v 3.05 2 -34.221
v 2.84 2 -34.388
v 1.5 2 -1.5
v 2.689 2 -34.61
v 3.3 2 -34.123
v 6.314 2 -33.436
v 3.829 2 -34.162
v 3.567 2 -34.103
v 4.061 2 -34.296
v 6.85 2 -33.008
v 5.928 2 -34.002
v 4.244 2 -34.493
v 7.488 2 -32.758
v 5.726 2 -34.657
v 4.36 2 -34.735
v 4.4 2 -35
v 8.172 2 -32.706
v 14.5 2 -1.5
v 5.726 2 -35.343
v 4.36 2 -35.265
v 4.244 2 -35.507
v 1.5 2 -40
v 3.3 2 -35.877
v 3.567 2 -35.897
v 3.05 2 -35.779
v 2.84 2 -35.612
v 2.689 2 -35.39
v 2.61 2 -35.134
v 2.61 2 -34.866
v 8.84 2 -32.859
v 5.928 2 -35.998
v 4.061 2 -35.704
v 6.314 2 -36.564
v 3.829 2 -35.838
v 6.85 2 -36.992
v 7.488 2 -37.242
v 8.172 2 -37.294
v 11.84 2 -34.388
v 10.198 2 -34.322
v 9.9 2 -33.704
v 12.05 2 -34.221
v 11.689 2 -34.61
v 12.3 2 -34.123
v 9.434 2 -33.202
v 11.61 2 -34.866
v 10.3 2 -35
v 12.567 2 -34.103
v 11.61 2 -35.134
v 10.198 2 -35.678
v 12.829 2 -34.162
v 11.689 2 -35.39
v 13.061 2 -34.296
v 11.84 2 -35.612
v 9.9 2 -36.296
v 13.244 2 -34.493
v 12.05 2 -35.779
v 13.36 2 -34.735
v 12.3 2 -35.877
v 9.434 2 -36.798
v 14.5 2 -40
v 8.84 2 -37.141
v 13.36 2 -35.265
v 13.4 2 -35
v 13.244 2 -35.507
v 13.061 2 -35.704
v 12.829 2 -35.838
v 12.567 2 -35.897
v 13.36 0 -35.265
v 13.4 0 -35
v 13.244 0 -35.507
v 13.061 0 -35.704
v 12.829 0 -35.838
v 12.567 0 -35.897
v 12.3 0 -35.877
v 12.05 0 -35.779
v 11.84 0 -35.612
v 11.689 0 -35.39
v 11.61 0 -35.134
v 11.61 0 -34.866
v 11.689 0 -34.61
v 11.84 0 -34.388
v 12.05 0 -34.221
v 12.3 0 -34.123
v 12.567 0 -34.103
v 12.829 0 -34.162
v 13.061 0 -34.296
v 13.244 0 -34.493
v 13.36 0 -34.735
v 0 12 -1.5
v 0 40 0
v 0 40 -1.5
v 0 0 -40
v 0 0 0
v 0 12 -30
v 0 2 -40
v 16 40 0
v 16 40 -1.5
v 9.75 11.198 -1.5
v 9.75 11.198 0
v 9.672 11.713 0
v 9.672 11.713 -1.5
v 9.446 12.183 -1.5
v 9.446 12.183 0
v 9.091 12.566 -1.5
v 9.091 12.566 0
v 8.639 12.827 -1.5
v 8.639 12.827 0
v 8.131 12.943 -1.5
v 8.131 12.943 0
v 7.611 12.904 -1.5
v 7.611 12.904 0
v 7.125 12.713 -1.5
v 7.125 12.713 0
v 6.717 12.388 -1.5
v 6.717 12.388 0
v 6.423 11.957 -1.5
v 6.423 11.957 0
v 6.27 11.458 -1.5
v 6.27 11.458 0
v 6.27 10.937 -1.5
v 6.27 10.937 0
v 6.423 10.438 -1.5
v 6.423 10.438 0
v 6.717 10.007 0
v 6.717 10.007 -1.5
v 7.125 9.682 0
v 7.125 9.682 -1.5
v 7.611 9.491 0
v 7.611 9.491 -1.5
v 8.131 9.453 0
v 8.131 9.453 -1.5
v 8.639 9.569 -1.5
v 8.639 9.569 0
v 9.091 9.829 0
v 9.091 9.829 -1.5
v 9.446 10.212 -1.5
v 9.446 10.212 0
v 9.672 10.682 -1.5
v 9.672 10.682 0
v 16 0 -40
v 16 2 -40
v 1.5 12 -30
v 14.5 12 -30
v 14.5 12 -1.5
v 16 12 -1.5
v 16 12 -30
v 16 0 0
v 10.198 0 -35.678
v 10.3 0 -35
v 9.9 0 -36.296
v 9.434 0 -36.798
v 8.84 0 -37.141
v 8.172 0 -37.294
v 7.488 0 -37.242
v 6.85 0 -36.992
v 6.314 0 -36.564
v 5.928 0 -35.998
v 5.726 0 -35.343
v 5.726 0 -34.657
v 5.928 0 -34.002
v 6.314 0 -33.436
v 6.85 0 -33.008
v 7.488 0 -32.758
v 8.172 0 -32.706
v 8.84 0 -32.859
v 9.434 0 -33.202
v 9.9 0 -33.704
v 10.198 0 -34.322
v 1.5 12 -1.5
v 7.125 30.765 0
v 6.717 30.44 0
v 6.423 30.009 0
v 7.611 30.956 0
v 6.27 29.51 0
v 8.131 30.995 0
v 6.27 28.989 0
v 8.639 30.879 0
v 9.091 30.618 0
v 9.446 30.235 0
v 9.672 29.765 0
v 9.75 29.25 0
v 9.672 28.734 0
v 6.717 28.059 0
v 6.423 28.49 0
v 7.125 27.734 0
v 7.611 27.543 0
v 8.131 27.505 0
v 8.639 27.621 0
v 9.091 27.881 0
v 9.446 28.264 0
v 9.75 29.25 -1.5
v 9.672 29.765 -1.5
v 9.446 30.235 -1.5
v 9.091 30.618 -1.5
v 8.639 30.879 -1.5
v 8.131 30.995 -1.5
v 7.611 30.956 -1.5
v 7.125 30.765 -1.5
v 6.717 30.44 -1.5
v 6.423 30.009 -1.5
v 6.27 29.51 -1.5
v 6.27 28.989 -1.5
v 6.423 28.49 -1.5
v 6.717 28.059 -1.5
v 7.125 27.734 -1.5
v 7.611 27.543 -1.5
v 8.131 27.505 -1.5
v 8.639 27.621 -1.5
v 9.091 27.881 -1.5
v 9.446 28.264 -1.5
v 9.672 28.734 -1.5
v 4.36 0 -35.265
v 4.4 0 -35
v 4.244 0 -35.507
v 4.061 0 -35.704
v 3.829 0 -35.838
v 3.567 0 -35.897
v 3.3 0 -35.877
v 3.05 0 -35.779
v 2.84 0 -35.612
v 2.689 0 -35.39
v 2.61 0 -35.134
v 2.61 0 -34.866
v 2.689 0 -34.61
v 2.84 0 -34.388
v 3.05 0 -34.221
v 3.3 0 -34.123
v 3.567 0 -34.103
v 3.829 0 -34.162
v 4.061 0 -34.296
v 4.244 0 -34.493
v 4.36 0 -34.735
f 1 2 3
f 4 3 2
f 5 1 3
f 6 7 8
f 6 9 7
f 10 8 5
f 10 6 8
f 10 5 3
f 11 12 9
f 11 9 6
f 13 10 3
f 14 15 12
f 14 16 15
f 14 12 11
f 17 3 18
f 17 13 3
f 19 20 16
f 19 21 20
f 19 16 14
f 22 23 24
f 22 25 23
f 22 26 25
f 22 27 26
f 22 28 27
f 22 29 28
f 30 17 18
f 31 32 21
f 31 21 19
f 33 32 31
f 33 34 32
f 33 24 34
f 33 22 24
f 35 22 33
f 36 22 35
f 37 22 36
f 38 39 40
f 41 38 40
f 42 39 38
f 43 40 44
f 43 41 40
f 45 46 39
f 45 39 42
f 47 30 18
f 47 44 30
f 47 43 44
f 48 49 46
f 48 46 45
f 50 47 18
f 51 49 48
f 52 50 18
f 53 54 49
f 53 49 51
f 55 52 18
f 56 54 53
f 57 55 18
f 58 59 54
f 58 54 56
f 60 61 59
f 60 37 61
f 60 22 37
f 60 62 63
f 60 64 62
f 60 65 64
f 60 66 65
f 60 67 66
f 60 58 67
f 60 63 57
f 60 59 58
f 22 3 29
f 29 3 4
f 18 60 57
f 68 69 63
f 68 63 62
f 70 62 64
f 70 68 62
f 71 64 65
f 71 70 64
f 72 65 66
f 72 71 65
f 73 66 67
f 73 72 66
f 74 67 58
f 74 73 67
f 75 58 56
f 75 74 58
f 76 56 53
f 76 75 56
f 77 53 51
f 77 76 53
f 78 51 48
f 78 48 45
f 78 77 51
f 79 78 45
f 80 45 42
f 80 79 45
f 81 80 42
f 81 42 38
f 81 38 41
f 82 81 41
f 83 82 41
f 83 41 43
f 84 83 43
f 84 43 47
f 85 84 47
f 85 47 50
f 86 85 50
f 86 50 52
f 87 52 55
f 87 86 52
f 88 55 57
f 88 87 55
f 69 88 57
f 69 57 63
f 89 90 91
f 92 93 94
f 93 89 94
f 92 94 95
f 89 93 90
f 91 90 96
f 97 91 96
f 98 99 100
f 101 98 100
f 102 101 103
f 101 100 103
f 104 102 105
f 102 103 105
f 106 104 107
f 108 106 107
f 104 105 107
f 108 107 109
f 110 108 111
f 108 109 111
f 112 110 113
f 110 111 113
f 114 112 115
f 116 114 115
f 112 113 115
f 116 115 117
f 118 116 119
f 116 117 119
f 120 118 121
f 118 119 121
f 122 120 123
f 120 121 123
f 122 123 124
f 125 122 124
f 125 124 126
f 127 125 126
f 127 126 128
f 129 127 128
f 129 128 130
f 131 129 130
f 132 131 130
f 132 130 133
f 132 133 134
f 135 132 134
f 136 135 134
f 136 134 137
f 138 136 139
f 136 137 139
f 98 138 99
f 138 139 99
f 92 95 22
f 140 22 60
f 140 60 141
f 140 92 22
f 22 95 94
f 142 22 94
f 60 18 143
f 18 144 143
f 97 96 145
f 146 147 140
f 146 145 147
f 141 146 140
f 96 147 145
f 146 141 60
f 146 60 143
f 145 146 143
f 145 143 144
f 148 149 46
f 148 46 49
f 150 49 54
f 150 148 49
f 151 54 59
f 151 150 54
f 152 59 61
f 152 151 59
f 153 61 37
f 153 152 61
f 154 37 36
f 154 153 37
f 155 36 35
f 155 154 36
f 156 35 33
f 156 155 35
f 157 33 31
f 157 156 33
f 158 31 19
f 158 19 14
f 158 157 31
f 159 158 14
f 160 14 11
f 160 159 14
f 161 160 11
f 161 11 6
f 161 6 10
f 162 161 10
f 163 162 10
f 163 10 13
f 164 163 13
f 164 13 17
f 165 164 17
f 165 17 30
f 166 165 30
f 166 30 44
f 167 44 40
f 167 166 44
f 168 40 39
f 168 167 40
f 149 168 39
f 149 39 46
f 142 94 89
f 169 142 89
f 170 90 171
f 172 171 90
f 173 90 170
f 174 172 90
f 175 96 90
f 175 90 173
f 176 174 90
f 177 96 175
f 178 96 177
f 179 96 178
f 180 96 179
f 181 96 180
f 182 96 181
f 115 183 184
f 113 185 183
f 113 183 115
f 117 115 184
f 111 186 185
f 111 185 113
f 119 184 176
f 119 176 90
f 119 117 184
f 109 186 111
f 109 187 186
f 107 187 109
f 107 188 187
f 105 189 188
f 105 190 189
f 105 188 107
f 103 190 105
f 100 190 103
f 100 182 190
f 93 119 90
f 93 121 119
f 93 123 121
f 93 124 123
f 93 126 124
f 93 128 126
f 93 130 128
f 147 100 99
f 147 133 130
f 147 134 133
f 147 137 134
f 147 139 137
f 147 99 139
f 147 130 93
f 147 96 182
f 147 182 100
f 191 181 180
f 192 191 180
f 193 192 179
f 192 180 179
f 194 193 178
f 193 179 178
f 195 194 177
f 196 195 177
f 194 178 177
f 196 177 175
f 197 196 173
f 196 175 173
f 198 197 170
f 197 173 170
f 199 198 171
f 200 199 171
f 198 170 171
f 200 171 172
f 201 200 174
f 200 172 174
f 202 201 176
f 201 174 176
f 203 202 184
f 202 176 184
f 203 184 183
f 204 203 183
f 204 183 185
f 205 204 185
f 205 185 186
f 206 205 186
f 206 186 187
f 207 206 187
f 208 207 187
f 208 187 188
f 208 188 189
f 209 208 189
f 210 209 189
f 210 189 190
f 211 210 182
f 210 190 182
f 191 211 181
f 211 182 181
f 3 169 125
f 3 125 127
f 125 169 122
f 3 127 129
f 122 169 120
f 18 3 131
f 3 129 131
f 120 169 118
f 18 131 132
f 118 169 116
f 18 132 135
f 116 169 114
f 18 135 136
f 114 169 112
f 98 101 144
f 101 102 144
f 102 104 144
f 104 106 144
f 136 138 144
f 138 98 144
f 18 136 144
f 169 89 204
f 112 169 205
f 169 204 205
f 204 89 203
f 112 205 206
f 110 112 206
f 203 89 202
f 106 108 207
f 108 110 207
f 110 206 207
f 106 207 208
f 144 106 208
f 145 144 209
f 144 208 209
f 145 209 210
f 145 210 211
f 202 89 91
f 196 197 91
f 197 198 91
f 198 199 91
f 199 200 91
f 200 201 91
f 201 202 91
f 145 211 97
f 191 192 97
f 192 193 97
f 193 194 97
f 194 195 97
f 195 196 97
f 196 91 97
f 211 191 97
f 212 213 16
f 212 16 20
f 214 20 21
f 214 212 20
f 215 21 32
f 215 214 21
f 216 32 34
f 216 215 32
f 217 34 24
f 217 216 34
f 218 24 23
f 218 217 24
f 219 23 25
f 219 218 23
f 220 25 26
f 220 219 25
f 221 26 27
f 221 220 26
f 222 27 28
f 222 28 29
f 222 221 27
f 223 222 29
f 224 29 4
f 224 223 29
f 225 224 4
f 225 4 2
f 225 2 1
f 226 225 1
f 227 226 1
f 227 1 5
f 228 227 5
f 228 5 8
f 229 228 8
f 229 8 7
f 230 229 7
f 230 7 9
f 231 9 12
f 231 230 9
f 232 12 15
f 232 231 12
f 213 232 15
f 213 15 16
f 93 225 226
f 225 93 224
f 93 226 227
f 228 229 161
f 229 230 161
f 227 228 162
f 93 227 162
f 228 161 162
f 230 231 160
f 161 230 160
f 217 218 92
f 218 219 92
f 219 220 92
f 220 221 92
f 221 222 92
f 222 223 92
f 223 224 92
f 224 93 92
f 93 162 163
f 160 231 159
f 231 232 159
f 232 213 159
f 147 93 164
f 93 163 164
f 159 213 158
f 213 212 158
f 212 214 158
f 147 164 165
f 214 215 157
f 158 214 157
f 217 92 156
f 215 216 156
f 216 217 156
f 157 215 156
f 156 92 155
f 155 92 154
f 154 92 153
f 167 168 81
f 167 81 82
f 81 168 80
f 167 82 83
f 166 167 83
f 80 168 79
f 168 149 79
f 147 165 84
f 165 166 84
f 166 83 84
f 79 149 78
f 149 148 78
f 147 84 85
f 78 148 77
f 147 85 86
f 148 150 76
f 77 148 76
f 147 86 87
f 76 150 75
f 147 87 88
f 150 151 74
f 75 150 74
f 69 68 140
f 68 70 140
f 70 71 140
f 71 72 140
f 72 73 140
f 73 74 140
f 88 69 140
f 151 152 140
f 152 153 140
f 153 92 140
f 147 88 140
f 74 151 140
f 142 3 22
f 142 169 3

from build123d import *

# Parameters (mm, degrees)
SKETCH1_W           = 16
SKETCH1_H           = 40
SKETCH1_R           = 2.3
SKETCH1_R_2         = 0.9
BOSS_EXTRUDE1_DEPTH = 2
BOSS_EXTRUDE2_DEPTH = 1.5
BOSS_EXTRUDE3_DEPTH = 1.5
SKETCH4_W           = 16
SKETCH4_H           = 40
SKETCH4_R           = 1.75
BOSS_EXTRUDE4_DEPTH = 1.5


with BuildPart() as part:
    # Sketch1 → Boss-Extrude1 (new body)
    with BuildSketch(Plane(origin=(0, 0, 0), x_dir=(1, 0, 0), z_dir=(0, 1, 0))):
        with Locations((8, 20)):
            Rectangle(SKETCH1_W, SKETCH1_H)
        with Locations((8, 35)):
            Circle(SKETCH1_R, mode=Mode.SUBTRACT)
        with Locations((3.5, 35)):
            Circle(SKETCH1_R_2, mode=Mode.SUBTRACT)
        with Locations((12.5, 35)):
            Circle(SKETCH1_R_2, mode=Mode.SUBTRACT)
    extrude(amount=BOSS_EXTRUDE1_DEPTH)

    # Sketch2 → Boss-Extrude2 (add)
    with BuildSketch(Plane.ZY):
        Polygon((-40, 2), (-30, 12), (0, 12), (0, 2), align=None)
    extrude(amount=-BOSS_EXTRUDE2_DEPTH)

    # Sketch3 → Boss-Extrude3 (add)
    with BuildSketch(Plane(origin=(16, 0, -16), x_dir=(0, 0, 1), z_dir=(-1, 0, 0))):
        Polygon((-24, 2), (-14, 12), (16, 12), (16, 2), align=None)
    extrude(amount=BOSS_EXTRUDE3_DEPTH)

    # Sketch4 → Boss-Extrude4 (add)
    with BuildSketch(Plane.XY):
        with Locations((8, 20)):
            Rectangle(SKETCH4_W, SKETCH4_H)
        with Locations((8, 11.197621249)):
            Circle(SKETCH4_R, mode=Mode.SUBTRACT)
        with Locations((8, 29.249612775)):
            Circle(SKETCH4_R, mode=Mode.SUBTRACT)
    extrude(amount=-BOSS_EXTRUDE4_DEPTH)


solid = part.part
